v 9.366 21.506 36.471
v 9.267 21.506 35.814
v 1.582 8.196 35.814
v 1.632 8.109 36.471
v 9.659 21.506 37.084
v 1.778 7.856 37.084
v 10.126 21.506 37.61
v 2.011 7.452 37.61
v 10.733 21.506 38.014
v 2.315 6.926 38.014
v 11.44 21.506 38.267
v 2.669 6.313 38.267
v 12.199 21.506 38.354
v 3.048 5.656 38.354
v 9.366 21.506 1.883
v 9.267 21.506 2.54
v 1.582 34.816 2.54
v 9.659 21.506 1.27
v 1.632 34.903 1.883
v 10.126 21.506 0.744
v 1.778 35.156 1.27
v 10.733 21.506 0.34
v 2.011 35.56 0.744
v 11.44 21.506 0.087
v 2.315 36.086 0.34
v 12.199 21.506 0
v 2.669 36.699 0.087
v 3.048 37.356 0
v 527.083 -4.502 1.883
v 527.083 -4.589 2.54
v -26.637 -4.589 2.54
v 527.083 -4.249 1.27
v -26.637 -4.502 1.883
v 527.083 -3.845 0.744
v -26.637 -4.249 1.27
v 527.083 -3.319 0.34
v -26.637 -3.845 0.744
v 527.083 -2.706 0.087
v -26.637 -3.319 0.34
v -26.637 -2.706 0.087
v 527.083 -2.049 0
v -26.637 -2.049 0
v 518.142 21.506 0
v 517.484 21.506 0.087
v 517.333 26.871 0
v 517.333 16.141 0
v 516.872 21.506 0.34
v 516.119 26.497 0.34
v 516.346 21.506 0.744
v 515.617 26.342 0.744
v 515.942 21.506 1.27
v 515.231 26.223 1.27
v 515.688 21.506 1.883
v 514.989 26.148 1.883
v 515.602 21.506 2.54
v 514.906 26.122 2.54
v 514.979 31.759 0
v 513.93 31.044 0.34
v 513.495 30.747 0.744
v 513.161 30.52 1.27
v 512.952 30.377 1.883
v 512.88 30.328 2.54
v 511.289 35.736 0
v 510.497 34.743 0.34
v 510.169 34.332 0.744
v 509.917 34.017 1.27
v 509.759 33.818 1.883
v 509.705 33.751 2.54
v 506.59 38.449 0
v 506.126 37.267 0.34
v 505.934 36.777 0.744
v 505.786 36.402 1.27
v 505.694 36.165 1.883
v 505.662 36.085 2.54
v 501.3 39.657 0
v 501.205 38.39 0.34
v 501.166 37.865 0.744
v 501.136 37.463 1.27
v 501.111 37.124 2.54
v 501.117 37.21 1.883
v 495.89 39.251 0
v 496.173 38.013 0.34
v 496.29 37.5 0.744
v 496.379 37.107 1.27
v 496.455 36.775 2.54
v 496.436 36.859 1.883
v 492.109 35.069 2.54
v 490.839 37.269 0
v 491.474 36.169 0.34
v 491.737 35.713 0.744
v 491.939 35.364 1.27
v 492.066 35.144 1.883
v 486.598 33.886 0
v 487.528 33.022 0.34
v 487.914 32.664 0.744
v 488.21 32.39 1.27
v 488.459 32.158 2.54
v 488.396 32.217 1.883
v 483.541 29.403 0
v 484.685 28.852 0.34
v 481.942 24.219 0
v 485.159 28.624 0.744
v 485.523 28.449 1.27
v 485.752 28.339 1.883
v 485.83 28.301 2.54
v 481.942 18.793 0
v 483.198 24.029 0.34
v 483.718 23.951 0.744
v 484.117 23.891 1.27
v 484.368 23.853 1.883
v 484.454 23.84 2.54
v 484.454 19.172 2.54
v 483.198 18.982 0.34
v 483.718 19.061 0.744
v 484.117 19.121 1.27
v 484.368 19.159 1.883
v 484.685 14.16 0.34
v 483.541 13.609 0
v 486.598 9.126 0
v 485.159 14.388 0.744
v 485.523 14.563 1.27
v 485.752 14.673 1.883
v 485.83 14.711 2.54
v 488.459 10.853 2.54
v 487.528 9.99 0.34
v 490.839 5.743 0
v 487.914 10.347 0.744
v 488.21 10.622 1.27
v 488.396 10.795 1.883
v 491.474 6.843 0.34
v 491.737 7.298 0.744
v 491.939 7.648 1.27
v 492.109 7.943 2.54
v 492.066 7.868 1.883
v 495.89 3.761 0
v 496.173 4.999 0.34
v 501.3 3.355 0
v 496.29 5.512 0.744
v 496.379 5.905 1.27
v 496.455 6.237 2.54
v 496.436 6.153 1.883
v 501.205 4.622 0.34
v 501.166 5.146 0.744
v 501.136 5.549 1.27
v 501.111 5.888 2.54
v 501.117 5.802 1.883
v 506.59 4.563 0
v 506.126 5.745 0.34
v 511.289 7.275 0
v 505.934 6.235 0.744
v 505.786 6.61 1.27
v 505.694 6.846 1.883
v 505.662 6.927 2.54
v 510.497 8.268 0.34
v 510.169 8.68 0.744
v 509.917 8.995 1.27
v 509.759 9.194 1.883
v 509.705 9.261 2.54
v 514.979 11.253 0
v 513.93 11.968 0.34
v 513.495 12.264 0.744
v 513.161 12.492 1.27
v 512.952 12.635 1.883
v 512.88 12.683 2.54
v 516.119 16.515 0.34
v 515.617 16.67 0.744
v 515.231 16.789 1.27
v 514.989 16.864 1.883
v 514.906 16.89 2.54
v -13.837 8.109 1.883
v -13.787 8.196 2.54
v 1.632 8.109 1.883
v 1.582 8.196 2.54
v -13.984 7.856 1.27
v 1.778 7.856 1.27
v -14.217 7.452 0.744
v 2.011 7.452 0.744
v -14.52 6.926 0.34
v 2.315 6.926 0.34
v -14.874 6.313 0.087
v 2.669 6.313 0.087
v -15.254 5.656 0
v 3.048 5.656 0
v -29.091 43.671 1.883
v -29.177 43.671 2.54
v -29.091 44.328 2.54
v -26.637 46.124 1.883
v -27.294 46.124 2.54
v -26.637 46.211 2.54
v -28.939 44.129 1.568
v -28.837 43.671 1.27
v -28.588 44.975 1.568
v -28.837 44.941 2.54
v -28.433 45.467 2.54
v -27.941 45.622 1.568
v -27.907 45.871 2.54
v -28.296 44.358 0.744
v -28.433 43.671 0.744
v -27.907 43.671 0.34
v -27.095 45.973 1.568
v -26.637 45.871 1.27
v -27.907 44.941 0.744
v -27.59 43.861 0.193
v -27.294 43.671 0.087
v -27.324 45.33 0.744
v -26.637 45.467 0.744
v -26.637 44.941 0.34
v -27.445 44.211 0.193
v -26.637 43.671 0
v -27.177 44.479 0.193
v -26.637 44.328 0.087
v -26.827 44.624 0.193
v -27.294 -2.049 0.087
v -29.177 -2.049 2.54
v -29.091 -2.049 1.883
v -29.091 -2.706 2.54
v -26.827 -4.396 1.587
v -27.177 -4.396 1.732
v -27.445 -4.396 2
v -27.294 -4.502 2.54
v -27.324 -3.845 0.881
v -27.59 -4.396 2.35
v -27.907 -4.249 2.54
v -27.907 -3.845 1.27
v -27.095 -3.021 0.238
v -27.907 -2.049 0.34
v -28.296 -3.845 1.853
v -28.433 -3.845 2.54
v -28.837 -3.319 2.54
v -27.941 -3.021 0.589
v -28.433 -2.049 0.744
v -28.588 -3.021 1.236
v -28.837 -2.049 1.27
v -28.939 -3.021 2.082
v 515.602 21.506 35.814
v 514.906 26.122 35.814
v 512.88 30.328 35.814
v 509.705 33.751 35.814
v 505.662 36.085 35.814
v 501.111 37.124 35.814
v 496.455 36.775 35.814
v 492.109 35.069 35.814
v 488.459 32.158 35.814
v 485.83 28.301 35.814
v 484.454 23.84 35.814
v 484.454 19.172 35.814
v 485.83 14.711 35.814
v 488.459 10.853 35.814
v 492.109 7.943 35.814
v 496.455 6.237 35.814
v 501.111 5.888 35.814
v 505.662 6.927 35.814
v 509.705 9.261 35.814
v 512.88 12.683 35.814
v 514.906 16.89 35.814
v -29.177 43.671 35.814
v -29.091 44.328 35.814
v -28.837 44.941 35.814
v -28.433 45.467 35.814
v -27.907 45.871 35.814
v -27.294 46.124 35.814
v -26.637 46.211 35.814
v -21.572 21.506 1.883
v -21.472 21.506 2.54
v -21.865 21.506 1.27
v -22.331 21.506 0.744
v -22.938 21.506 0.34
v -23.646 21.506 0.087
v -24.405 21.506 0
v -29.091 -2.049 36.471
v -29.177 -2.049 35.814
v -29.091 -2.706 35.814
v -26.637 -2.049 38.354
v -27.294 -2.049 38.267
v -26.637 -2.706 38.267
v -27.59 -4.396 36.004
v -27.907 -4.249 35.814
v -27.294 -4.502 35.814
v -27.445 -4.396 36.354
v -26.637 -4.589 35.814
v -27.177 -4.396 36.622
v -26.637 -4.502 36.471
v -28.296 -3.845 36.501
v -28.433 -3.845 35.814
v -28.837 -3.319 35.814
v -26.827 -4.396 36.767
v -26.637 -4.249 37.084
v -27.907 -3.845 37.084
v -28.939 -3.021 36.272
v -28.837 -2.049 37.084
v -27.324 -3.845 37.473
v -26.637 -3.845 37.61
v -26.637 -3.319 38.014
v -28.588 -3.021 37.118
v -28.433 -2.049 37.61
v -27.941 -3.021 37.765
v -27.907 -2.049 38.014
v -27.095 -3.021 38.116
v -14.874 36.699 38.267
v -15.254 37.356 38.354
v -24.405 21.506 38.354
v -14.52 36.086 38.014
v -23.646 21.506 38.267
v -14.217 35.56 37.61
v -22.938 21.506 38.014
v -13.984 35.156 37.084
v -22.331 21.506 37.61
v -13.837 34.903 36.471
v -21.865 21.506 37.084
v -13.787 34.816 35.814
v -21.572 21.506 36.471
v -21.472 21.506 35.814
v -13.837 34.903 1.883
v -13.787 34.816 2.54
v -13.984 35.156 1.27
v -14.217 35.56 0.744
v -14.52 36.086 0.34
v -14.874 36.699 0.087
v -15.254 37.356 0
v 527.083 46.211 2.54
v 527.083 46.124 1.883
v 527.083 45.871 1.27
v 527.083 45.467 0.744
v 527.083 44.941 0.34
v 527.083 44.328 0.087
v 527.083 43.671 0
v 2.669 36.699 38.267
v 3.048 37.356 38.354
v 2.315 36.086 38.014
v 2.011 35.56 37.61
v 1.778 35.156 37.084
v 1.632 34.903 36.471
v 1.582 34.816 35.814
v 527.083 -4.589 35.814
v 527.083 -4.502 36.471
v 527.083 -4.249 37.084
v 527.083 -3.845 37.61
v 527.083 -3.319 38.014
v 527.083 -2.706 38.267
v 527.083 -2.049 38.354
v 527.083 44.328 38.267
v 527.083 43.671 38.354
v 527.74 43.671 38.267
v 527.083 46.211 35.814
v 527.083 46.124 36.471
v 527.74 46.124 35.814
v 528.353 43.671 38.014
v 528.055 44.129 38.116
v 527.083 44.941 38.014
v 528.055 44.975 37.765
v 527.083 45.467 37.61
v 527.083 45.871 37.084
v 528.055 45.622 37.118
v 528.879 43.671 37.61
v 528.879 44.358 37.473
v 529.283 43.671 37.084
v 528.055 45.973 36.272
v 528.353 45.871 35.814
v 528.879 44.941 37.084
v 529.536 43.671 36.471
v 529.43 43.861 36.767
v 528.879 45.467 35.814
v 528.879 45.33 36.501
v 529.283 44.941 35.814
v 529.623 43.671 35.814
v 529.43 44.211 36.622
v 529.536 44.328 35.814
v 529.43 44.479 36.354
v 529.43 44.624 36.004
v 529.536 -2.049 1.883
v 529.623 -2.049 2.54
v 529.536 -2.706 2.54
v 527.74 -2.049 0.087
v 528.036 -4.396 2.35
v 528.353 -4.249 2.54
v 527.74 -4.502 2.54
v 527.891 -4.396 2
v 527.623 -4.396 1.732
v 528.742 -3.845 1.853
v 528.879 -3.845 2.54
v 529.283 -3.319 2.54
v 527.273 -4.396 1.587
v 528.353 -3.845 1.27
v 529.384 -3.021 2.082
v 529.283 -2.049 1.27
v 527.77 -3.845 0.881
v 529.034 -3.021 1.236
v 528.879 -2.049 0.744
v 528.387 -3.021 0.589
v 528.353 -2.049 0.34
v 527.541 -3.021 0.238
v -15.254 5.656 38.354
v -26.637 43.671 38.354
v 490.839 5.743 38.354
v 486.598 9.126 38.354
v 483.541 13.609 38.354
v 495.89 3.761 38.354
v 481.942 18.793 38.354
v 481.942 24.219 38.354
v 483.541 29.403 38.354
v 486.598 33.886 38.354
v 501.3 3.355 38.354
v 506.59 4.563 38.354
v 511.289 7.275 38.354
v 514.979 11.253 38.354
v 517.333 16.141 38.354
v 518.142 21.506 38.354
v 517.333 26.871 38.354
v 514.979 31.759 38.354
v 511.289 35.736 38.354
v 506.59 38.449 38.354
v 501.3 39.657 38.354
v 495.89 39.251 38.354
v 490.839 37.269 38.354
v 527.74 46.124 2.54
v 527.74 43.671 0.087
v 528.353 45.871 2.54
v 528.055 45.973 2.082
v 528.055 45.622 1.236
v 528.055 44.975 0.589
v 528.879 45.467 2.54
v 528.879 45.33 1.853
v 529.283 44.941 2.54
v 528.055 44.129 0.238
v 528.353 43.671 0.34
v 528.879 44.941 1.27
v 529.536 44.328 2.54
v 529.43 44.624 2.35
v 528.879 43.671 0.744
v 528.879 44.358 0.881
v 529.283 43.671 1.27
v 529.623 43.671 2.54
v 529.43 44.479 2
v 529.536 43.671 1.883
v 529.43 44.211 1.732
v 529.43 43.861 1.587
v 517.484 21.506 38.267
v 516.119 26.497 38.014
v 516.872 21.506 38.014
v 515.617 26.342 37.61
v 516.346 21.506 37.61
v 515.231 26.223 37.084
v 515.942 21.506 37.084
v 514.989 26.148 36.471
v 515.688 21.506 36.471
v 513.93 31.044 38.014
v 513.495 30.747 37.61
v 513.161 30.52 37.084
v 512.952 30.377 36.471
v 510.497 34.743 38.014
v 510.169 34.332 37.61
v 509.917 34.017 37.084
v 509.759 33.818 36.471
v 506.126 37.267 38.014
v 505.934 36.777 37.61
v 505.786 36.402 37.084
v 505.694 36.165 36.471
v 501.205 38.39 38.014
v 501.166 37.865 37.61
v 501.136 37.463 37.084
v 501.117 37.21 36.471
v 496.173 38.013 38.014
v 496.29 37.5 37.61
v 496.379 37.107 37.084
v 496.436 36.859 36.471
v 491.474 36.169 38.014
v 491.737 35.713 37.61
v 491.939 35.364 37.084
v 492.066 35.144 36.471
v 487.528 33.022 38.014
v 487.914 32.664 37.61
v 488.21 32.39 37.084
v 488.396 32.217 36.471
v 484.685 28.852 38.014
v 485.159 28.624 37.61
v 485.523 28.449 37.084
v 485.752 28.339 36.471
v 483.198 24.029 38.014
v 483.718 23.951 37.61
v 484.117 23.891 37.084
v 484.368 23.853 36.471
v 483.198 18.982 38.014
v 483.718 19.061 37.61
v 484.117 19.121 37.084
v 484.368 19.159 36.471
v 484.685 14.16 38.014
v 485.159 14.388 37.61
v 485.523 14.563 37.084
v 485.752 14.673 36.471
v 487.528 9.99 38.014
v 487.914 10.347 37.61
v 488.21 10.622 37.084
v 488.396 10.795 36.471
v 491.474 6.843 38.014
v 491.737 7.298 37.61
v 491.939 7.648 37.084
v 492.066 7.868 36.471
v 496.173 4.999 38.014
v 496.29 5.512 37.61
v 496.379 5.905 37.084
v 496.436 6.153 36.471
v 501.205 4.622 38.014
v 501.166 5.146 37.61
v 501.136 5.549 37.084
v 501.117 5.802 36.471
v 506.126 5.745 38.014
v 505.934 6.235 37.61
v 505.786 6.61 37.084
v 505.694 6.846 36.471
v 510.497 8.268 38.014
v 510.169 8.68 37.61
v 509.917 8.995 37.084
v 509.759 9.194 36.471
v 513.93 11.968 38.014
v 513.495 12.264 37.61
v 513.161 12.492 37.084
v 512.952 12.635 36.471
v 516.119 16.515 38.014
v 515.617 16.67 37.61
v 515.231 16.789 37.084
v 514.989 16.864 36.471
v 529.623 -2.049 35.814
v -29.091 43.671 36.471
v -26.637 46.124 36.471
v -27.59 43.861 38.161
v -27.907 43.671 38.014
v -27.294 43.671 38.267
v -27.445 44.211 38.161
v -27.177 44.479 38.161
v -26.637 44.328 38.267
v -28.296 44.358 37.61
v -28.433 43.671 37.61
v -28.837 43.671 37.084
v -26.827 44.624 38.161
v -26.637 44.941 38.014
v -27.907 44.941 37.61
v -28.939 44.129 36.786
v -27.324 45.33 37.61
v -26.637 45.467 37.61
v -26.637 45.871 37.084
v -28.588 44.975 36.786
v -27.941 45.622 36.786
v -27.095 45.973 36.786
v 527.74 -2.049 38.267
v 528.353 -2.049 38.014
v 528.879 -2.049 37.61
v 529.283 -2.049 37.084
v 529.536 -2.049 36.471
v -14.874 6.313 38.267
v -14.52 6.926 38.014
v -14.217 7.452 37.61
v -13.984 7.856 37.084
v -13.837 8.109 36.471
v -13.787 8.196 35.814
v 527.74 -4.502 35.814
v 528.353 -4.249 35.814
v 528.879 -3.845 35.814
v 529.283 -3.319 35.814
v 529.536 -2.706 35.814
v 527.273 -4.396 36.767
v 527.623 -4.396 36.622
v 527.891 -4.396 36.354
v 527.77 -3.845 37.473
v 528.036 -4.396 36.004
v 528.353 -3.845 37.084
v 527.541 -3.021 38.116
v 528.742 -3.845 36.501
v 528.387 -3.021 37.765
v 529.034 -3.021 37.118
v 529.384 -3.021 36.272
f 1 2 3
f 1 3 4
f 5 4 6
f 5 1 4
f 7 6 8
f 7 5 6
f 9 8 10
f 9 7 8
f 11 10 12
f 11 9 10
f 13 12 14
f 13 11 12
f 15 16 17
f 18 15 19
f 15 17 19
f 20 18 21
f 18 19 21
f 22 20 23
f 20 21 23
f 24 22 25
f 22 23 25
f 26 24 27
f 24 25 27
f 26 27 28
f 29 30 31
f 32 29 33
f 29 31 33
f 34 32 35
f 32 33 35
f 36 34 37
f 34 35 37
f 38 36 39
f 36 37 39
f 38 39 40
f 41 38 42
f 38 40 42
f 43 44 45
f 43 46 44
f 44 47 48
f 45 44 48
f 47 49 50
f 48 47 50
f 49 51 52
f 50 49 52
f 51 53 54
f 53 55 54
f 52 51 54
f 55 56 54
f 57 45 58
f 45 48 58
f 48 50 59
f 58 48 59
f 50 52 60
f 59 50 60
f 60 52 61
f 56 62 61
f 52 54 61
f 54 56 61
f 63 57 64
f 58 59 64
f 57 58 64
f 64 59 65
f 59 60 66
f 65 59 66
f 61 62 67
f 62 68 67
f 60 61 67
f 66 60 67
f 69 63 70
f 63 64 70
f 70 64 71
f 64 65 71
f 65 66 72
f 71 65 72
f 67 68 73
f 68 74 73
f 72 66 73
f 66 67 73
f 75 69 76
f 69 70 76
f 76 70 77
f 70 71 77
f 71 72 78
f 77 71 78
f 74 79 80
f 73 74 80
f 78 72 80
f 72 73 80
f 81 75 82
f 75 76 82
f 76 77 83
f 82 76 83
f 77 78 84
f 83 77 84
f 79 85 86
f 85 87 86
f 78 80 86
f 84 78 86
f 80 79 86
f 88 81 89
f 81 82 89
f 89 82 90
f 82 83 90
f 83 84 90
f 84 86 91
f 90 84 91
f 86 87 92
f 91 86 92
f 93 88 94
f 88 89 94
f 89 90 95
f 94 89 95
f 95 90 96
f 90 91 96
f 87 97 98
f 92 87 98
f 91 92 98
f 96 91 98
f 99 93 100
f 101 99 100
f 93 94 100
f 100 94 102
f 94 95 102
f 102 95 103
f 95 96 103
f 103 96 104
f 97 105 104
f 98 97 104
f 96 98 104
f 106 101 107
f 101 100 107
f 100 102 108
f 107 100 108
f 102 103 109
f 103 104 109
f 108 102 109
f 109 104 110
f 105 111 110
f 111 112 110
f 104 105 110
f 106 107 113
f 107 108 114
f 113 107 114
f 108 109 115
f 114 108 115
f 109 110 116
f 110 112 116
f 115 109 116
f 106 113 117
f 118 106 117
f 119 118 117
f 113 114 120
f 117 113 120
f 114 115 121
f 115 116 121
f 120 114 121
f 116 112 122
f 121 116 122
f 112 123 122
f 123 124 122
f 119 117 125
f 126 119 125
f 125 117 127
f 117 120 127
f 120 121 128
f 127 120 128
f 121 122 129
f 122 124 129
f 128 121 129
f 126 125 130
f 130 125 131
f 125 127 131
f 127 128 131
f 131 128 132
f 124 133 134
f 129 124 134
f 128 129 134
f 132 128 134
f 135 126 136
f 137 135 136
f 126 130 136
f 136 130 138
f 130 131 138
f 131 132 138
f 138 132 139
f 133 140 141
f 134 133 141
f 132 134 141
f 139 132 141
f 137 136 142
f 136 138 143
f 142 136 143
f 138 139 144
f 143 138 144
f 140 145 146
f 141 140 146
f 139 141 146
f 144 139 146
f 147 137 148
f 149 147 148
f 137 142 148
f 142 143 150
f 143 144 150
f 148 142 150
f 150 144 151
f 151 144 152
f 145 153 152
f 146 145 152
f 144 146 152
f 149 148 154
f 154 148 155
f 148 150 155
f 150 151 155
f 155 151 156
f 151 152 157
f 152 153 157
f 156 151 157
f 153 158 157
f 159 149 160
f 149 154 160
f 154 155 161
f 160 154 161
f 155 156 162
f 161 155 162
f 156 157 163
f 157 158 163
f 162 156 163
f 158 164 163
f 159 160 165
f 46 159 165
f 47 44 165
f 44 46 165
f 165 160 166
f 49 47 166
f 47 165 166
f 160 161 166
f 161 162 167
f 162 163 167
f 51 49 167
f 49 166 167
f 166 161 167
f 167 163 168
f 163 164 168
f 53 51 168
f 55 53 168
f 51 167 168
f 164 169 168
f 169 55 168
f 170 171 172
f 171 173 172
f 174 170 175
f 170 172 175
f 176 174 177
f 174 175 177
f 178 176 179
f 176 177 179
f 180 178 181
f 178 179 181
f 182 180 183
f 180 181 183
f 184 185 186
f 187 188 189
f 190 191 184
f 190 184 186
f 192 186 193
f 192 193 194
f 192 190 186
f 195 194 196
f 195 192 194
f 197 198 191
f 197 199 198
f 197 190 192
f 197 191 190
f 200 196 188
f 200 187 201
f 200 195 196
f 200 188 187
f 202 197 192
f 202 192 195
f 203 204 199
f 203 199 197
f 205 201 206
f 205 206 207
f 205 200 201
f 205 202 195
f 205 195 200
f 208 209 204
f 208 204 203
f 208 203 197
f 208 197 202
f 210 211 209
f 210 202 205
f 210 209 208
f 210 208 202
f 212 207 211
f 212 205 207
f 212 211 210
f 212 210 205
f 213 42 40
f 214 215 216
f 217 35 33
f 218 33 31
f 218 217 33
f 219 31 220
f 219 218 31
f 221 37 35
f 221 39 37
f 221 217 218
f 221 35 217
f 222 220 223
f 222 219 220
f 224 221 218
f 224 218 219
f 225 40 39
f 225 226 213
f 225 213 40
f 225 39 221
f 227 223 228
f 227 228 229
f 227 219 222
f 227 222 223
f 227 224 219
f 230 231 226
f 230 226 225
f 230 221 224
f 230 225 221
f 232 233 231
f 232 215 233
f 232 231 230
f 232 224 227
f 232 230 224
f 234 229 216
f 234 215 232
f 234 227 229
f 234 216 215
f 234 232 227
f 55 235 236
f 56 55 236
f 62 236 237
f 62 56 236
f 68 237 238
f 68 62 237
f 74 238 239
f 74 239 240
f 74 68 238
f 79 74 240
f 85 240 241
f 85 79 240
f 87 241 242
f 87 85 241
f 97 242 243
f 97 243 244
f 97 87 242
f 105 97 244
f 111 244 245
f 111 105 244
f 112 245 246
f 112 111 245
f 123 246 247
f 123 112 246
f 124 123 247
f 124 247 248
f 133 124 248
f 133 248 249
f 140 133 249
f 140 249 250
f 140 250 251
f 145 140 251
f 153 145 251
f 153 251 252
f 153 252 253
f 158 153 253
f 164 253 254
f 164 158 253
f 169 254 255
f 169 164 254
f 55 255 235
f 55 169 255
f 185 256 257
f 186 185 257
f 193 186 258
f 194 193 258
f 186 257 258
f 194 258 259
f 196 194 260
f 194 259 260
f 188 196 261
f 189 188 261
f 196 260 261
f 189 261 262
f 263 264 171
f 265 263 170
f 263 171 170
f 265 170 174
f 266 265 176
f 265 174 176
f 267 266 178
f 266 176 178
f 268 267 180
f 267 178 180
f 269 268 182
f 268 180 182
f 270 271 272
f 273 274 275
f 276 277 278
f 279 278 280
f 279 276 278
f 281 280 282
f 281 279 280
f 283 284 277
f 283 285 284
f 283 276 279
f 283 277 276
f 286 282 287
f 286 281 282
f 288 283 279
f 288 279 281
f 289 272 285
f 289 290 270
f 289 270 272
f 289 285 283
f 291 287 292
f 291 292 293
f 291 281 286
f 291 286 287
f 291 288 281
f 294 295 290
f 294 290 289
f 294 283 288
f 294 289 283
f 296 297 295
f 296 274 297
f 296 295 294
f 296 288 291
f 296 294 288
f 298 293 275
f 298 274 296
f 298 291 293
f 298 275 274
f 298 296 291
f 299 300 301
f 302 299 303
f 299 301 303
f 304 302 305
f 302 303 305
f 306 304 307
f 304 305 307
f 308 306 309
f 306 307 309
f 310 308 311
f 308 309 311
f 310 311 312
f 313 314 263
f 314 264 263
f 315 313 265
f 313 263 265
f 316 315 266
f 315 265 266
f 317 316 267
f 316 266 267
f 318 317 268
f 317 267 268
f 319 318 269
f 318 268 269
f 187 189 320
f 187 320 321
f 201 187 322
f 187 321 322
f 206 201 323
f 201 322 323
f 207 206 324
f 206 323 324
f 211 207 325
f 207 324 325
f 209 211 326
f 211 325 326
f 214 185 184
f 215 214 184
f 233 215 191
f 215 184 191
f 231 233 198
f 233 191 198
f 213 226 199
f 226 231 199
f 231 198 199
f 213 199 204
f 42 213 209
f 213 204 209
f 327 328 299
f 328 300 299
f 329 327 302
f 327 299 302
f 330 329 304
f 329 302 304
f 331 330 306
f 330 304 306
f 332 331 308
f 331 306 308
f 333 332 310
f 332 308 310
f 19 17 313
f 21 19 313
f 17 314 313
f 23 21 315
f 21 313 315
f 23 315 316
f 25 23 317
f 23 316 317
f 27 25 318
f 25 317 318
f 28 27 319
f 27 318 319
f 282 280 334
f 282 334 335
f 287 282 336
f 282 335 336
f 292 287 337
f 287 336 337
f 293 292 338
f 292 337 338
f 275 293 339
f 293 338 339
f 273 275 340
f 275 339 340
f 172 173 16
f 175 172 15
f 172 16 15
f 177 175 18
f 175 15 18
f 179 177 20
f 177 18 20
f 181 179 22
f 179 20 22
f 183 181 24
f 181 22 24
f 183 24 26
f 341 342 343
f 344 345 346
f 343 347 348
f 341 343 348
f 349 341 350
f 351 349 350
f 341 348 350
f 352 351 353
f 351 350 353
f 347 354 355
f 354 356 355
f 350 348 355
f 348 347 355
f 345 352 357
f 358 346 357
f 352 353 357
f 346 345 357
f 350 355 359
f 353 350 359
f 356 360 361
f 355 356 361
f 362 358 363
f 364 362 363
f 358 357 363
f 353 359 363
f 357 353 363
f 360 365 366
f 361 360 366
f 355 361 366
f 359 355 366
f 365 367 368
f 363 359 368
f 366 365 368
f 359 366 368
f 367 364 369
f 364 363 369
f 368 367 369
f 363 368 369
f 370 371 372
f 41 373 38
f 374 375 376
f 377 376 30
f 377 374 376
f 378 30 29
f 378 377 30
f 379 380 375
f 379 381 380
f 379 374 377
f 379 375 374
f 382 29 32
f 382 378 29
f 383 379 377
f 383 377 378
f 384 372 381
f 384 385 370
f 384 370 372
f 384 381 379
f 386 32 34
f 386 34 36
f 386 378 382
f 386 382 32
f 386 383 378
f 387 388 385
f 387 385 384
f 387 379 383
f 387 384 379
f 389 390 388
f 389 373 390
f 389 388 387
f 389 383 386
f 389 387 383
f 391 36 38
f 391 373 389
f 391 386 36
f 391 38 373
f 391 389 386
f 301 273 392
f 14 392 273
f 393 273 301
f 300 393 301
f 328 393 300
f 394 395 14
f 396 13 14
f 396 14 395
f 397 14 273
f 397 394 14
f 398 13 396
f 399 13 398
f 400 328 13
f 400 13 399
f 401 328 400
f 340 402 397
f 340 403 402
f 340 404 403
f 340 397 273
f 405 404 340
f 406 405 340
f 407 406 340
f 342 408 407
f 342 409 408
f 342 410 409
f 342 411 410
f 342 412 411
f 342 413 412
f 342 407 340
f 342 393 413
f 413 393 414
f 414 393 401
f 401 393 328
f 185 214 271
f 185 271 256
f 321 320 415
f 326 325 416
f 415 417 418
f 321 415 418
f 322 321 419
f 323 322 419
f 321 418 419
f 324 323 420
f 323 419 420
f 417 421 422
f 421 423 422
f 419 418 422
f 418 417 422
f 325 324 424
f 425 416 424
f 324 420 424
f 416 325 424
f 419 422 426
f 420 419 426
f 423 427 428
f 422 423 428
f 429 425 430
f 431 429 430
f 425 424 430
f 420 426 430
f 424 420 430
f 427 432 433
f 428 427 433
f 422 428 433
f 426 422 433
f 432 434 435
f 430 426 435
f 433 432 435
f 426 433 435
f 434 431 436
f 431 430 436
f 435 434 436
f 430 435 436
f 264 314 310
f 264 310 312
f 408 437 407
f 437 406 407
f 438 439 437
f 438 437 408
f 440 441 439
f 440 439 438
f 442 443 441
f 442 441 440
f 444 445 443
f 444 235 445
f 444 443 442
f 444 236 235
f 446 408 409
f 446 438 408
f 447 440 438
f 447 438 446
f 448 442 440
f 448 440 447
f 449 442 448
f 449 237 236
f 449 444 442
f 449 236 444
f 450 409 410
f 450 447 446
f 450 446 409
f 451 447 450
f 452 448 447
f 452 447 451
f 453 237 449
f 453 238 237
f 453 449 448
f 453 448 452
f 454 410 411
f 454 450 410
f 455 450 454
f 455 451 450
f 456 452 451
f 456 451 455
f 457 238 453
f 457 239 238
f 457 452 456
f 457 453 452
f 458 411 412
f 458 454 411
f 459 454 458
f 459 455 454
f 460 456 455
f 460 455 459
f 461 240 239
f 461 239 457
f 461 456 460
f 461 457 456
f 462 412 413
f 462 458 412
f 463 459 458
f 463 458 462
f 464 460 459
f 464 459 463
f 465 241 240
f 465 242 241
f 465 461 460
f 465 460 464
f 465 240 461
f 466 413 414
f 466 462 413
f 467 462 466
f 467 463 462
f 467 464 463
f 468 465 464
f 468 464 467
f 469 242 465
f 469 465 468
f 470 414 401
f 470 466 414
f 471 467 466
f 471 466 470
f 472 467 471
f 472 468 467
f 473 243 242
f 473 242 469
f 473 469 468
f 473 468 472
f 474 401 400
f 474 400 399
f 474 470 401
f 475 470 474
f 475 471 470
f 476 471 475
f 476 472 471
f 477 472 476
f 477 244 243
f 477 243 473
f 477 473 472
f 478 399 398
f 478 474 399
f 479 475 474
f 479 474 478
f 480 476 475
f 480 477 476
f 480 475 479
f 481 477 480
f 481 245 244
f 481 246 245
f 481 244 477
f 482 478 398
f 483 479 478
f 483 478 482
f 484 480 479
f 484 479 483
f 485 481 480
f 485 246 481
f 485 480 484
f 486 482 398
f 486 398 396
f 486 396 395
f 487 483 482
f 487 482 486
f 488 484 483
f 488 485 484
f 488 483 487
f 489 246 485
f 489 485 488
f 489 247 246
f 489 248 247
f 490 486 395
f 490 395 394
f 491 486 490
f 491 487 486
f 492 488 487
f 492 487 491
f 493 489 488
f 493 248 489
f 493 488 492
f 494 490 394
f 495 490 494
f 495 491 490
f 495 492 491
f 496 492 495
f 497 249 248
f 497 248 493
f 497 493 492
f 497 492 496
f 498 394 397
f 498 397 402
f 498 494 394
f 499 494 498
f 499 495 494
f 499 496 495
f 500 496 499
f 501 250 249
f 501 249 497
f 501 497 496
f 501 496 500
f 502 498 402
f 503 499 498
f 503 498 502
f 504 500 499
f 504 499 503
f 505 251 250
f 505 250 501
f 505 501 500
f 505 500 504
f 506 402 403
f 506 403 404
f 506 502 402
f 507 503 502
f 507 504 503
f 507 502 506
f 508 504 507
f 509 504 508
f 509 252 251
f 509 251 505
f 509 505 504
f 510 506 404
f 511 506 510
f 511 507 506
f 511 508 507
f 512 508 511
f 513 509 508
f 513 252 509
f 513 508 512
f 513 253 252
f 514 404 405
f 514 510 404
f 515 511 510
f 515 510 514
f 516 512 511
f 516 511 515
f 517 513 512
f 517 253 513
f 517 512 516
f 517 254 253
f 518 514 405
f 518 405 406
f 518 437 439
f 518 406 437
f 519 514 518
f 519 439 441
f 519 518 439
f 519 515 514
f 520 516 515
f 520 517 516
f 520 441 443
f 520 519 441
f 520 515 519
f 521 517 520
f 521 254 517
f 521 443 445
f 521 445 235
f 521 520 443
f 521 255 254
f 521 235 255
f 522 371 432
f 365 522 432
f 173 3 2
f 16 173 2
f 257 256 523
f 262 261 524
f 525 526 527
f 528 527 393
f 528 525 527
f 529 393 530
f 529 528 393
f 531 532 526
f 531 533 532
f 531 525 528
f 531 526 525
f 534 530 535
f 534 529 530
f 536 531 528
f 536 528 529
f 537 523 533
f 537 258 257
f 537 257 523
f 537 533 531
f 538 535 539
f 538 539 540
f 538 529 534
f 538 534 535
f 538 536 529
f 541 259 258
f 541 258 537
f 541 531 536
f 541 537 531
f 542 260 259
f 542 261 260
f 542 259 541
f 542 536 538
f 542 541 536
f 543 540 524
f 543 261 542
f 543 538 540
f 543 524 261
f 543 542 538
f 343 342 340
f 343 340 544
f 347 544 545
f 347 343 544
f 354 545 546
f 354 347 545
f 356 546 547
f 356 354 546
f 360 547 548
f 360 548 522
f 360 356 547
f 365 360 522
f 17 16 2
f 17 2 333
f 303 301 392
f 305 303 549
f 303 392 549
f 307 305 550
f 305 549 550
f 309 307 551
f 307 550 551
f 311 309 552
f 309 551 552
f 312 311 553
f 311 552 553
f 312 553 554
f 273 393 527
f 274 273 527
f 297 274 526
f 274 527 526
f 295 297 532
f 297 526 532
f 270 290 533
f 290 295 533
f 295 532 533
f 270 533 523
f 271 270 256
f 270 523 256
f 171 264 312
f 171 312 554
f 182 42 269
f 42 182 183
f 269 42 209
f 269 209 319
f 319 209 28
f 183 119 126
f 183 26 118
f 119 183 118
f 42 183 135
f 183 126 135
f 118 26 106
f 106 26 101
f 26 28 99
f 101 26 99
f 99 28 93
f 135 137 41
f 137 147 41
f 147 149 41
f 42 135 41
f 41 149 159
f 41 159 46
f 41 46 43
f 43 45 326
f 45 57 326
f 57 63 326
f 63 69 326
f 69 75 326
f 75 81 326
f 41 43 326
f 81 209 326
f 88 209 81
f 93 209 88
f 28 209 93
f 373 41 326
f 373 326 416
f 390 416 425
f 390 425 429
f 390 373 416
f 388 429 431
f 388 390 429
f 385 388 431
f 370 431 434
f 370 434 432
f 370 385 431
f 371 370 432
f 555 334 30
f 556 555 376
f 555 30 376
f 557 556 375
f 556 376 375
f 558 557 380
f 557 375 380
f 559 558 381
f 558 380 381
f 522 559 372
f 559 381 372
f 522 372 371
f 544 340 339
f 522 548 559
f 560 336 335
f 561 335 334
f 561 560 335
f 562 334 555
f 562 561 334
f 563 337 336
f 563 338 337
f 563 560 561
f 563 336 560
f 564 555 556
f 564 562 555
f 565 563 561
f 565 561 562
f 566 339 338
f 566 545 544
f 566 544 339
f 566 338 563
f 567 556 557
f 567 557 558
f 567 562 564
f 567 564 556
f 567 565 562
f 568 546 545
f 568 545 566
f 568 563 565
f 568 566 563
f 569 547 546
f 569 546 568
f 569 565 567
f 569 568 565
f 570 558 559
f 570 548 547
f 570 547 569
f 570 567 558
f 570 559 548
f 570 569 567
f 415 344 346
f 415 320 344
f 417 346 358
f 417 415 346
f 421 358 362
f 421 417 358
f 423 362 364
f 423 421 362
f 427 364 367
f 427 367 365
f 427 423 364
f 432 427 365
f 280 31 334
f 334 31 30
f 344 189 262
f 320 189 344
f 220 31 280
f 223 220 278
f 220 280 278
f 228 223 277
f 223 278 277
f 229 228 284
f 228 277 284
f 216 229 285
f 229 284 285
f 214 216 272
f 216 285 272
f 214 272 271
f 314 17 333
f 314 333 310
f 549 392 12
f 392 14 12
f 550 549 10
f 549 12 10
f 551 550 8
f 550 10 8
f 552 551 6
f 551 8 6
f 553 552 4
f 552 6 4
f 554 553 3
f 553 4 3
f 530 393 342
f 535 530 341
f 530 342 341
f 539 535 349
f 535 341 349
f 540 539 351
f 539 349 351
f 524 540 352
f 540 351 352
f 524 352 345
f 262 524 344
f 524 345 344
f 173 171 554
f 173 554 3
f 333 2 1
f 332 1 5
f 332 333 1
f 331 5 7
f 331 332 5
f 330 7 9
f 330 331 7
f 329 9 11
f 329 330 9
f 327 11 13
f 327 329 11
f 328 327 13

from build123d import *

# Parameters (mm, degrees)
SKETCH1_W           = 558.8
SKETCH1_H           = 50.8
SKETCH1_R           = 15.661500759
BOSS_EXTRUDE1_DEPTH = 38.354
FILLET2_R           = 2.54
FILLET3_R           = 2.54
FILLET4_R           = 2.54
FILLET5_R           = 2.54
FILLET6_R           = 2.54
FILLET7_R           = 2.54
FILLET8_R           = 2.54
FILLET9_R           = 2.54


with BuildPart() as part:
    # Sketch1 → Boss-Extrude1 (new body)
    with BuildSketch(Plane.XY):
        with Locations((250.222913627, 20.811022444)):
            Rectangle(SKETCH1_W, SKETCH1_H)
        with Locations((499.940155303, 21.505918387)):
            Circle(SKETCH1_R, mode=Mode.SUBTRACT)
        Polygon((9.266544067, 21.505918387), (1.58198055, 34.815972833), (-13.787146484, 34.815972833), (-21.471710001, 21.505918387), (-13.787146484, 8.195863942), (1.58198055, 8.195863942), align=None, mode=Mode.SUBTRACT)
    extrude(amount=BOSS_EXTRUDE1_DEPTH)

    # Fillet2
    fillet2_edges = [part.edges().sort_by_distance(p)[0] for p in [
        (-29.177086373, 46.211022444, 19.177),
    ]]
    fillet(fillet2_edges, radius=FILLET2_R)

    # Fillet3
    fillet3_edges = [part.edges().sort_by_distance(p)[0] for p in [
        (251.492913627, 46.211022444, 38.354),
        (-29.177086373, 19.541022444, 38.354),
        (-28.433137597, 45.467073669, 38.354),
    ]]
    fillet(fillet3_edges, radius=FILLET3_R)

    # Fillet4
    fillet4_edges = [part.edges().sort_by_distance(p)[0] for p in [
        (-29.177086373, 19.541022444, 0),
        (-28.433137597, 45.467073669, 0),
        (251.492913627, 46.211022444, 0),
    ]]
    fillet(fillet4_edges, radius=FILLET4_R)

    # Fillet5
    fillet5_edges = [part.edges().sort_by_distance(p)[0] for p in [
        (529.622913627, 19.541022444, 38.354),
        (529.622913627, 46.211022444, 19.177),
        (529.622913627, 45.467073669, 37.610051224),
        (529.622913627, 19.541022444, 0),
        (529.622913627, 45.467073669, 0.743948776),
    ]]
    fillet(fillet5_edges, radius=FILLET5_R)

    # Fillet6
    fillet6_edges = [part.edges().sort_by_distance(p)[0] for p in [
        (250.222913627, -4.588977556, 38.354),
        (-29.177086373, -4.588977556, 19.177),
        (-28.433137597, -4.588977556, 37.610051224),
        (250.222913627, -4.588977556, 0),
        (-28.433137597, -4.588977556, 0.743948776),
        (529.622913627, -4.588977556, 19.177),
        (528.878964852, -4.588977556, 37.610051224),
        (528.878964852, -4.588977556, 0.743948776),
    ]]
    fillet(fillet6_edges, radius=FILLET6_R)

    # Fillet7
    fillet7_edges = [part.edges().sort_by_distance(p)[0] for p in [
        (484.278654543, 21.505918387, 0),
        (484.278654543, 21.505918387, 38.354),
    ]]
    fillet(fillet7_edges, radius=FILLET7_R)

    # Fillet8
    fillet8_edges = [part.edges().sort_by_distance(p)[0] for p in [
        (5.424262309, 14.850891165, 0),
        (5.424262309, 28.16094561, 0),
        (-6.102582967, 34.815972833, 0),
        (-17.629428242, 28.16094561, 0),
        (-17.629428242, 14.850891165, 0),
        (-6.102582967, 8.195863942, 0),
    ]]
    fillet(fillet8_edges, radius=FILLET8_R)

    # Fillet9
    fillet9_edges = [part.edges().sort_by_distance(p)[0] for p in [
        (5.424262309, 14.850891165, 38.354),
        (5.424262309, 28.16094561, 38.354),
        (-6.102582967, 34.815972833, 38.354),
        (-17.629428242, 28.16094561, 38.354),
        (-17.629428242, 14.850891165, 38.354),
        (-6.102582967, 8.195863942, 38.354),
    ]]
    fillet(fillet9_edges, radius=FILLET9_R)


solid = part.part
